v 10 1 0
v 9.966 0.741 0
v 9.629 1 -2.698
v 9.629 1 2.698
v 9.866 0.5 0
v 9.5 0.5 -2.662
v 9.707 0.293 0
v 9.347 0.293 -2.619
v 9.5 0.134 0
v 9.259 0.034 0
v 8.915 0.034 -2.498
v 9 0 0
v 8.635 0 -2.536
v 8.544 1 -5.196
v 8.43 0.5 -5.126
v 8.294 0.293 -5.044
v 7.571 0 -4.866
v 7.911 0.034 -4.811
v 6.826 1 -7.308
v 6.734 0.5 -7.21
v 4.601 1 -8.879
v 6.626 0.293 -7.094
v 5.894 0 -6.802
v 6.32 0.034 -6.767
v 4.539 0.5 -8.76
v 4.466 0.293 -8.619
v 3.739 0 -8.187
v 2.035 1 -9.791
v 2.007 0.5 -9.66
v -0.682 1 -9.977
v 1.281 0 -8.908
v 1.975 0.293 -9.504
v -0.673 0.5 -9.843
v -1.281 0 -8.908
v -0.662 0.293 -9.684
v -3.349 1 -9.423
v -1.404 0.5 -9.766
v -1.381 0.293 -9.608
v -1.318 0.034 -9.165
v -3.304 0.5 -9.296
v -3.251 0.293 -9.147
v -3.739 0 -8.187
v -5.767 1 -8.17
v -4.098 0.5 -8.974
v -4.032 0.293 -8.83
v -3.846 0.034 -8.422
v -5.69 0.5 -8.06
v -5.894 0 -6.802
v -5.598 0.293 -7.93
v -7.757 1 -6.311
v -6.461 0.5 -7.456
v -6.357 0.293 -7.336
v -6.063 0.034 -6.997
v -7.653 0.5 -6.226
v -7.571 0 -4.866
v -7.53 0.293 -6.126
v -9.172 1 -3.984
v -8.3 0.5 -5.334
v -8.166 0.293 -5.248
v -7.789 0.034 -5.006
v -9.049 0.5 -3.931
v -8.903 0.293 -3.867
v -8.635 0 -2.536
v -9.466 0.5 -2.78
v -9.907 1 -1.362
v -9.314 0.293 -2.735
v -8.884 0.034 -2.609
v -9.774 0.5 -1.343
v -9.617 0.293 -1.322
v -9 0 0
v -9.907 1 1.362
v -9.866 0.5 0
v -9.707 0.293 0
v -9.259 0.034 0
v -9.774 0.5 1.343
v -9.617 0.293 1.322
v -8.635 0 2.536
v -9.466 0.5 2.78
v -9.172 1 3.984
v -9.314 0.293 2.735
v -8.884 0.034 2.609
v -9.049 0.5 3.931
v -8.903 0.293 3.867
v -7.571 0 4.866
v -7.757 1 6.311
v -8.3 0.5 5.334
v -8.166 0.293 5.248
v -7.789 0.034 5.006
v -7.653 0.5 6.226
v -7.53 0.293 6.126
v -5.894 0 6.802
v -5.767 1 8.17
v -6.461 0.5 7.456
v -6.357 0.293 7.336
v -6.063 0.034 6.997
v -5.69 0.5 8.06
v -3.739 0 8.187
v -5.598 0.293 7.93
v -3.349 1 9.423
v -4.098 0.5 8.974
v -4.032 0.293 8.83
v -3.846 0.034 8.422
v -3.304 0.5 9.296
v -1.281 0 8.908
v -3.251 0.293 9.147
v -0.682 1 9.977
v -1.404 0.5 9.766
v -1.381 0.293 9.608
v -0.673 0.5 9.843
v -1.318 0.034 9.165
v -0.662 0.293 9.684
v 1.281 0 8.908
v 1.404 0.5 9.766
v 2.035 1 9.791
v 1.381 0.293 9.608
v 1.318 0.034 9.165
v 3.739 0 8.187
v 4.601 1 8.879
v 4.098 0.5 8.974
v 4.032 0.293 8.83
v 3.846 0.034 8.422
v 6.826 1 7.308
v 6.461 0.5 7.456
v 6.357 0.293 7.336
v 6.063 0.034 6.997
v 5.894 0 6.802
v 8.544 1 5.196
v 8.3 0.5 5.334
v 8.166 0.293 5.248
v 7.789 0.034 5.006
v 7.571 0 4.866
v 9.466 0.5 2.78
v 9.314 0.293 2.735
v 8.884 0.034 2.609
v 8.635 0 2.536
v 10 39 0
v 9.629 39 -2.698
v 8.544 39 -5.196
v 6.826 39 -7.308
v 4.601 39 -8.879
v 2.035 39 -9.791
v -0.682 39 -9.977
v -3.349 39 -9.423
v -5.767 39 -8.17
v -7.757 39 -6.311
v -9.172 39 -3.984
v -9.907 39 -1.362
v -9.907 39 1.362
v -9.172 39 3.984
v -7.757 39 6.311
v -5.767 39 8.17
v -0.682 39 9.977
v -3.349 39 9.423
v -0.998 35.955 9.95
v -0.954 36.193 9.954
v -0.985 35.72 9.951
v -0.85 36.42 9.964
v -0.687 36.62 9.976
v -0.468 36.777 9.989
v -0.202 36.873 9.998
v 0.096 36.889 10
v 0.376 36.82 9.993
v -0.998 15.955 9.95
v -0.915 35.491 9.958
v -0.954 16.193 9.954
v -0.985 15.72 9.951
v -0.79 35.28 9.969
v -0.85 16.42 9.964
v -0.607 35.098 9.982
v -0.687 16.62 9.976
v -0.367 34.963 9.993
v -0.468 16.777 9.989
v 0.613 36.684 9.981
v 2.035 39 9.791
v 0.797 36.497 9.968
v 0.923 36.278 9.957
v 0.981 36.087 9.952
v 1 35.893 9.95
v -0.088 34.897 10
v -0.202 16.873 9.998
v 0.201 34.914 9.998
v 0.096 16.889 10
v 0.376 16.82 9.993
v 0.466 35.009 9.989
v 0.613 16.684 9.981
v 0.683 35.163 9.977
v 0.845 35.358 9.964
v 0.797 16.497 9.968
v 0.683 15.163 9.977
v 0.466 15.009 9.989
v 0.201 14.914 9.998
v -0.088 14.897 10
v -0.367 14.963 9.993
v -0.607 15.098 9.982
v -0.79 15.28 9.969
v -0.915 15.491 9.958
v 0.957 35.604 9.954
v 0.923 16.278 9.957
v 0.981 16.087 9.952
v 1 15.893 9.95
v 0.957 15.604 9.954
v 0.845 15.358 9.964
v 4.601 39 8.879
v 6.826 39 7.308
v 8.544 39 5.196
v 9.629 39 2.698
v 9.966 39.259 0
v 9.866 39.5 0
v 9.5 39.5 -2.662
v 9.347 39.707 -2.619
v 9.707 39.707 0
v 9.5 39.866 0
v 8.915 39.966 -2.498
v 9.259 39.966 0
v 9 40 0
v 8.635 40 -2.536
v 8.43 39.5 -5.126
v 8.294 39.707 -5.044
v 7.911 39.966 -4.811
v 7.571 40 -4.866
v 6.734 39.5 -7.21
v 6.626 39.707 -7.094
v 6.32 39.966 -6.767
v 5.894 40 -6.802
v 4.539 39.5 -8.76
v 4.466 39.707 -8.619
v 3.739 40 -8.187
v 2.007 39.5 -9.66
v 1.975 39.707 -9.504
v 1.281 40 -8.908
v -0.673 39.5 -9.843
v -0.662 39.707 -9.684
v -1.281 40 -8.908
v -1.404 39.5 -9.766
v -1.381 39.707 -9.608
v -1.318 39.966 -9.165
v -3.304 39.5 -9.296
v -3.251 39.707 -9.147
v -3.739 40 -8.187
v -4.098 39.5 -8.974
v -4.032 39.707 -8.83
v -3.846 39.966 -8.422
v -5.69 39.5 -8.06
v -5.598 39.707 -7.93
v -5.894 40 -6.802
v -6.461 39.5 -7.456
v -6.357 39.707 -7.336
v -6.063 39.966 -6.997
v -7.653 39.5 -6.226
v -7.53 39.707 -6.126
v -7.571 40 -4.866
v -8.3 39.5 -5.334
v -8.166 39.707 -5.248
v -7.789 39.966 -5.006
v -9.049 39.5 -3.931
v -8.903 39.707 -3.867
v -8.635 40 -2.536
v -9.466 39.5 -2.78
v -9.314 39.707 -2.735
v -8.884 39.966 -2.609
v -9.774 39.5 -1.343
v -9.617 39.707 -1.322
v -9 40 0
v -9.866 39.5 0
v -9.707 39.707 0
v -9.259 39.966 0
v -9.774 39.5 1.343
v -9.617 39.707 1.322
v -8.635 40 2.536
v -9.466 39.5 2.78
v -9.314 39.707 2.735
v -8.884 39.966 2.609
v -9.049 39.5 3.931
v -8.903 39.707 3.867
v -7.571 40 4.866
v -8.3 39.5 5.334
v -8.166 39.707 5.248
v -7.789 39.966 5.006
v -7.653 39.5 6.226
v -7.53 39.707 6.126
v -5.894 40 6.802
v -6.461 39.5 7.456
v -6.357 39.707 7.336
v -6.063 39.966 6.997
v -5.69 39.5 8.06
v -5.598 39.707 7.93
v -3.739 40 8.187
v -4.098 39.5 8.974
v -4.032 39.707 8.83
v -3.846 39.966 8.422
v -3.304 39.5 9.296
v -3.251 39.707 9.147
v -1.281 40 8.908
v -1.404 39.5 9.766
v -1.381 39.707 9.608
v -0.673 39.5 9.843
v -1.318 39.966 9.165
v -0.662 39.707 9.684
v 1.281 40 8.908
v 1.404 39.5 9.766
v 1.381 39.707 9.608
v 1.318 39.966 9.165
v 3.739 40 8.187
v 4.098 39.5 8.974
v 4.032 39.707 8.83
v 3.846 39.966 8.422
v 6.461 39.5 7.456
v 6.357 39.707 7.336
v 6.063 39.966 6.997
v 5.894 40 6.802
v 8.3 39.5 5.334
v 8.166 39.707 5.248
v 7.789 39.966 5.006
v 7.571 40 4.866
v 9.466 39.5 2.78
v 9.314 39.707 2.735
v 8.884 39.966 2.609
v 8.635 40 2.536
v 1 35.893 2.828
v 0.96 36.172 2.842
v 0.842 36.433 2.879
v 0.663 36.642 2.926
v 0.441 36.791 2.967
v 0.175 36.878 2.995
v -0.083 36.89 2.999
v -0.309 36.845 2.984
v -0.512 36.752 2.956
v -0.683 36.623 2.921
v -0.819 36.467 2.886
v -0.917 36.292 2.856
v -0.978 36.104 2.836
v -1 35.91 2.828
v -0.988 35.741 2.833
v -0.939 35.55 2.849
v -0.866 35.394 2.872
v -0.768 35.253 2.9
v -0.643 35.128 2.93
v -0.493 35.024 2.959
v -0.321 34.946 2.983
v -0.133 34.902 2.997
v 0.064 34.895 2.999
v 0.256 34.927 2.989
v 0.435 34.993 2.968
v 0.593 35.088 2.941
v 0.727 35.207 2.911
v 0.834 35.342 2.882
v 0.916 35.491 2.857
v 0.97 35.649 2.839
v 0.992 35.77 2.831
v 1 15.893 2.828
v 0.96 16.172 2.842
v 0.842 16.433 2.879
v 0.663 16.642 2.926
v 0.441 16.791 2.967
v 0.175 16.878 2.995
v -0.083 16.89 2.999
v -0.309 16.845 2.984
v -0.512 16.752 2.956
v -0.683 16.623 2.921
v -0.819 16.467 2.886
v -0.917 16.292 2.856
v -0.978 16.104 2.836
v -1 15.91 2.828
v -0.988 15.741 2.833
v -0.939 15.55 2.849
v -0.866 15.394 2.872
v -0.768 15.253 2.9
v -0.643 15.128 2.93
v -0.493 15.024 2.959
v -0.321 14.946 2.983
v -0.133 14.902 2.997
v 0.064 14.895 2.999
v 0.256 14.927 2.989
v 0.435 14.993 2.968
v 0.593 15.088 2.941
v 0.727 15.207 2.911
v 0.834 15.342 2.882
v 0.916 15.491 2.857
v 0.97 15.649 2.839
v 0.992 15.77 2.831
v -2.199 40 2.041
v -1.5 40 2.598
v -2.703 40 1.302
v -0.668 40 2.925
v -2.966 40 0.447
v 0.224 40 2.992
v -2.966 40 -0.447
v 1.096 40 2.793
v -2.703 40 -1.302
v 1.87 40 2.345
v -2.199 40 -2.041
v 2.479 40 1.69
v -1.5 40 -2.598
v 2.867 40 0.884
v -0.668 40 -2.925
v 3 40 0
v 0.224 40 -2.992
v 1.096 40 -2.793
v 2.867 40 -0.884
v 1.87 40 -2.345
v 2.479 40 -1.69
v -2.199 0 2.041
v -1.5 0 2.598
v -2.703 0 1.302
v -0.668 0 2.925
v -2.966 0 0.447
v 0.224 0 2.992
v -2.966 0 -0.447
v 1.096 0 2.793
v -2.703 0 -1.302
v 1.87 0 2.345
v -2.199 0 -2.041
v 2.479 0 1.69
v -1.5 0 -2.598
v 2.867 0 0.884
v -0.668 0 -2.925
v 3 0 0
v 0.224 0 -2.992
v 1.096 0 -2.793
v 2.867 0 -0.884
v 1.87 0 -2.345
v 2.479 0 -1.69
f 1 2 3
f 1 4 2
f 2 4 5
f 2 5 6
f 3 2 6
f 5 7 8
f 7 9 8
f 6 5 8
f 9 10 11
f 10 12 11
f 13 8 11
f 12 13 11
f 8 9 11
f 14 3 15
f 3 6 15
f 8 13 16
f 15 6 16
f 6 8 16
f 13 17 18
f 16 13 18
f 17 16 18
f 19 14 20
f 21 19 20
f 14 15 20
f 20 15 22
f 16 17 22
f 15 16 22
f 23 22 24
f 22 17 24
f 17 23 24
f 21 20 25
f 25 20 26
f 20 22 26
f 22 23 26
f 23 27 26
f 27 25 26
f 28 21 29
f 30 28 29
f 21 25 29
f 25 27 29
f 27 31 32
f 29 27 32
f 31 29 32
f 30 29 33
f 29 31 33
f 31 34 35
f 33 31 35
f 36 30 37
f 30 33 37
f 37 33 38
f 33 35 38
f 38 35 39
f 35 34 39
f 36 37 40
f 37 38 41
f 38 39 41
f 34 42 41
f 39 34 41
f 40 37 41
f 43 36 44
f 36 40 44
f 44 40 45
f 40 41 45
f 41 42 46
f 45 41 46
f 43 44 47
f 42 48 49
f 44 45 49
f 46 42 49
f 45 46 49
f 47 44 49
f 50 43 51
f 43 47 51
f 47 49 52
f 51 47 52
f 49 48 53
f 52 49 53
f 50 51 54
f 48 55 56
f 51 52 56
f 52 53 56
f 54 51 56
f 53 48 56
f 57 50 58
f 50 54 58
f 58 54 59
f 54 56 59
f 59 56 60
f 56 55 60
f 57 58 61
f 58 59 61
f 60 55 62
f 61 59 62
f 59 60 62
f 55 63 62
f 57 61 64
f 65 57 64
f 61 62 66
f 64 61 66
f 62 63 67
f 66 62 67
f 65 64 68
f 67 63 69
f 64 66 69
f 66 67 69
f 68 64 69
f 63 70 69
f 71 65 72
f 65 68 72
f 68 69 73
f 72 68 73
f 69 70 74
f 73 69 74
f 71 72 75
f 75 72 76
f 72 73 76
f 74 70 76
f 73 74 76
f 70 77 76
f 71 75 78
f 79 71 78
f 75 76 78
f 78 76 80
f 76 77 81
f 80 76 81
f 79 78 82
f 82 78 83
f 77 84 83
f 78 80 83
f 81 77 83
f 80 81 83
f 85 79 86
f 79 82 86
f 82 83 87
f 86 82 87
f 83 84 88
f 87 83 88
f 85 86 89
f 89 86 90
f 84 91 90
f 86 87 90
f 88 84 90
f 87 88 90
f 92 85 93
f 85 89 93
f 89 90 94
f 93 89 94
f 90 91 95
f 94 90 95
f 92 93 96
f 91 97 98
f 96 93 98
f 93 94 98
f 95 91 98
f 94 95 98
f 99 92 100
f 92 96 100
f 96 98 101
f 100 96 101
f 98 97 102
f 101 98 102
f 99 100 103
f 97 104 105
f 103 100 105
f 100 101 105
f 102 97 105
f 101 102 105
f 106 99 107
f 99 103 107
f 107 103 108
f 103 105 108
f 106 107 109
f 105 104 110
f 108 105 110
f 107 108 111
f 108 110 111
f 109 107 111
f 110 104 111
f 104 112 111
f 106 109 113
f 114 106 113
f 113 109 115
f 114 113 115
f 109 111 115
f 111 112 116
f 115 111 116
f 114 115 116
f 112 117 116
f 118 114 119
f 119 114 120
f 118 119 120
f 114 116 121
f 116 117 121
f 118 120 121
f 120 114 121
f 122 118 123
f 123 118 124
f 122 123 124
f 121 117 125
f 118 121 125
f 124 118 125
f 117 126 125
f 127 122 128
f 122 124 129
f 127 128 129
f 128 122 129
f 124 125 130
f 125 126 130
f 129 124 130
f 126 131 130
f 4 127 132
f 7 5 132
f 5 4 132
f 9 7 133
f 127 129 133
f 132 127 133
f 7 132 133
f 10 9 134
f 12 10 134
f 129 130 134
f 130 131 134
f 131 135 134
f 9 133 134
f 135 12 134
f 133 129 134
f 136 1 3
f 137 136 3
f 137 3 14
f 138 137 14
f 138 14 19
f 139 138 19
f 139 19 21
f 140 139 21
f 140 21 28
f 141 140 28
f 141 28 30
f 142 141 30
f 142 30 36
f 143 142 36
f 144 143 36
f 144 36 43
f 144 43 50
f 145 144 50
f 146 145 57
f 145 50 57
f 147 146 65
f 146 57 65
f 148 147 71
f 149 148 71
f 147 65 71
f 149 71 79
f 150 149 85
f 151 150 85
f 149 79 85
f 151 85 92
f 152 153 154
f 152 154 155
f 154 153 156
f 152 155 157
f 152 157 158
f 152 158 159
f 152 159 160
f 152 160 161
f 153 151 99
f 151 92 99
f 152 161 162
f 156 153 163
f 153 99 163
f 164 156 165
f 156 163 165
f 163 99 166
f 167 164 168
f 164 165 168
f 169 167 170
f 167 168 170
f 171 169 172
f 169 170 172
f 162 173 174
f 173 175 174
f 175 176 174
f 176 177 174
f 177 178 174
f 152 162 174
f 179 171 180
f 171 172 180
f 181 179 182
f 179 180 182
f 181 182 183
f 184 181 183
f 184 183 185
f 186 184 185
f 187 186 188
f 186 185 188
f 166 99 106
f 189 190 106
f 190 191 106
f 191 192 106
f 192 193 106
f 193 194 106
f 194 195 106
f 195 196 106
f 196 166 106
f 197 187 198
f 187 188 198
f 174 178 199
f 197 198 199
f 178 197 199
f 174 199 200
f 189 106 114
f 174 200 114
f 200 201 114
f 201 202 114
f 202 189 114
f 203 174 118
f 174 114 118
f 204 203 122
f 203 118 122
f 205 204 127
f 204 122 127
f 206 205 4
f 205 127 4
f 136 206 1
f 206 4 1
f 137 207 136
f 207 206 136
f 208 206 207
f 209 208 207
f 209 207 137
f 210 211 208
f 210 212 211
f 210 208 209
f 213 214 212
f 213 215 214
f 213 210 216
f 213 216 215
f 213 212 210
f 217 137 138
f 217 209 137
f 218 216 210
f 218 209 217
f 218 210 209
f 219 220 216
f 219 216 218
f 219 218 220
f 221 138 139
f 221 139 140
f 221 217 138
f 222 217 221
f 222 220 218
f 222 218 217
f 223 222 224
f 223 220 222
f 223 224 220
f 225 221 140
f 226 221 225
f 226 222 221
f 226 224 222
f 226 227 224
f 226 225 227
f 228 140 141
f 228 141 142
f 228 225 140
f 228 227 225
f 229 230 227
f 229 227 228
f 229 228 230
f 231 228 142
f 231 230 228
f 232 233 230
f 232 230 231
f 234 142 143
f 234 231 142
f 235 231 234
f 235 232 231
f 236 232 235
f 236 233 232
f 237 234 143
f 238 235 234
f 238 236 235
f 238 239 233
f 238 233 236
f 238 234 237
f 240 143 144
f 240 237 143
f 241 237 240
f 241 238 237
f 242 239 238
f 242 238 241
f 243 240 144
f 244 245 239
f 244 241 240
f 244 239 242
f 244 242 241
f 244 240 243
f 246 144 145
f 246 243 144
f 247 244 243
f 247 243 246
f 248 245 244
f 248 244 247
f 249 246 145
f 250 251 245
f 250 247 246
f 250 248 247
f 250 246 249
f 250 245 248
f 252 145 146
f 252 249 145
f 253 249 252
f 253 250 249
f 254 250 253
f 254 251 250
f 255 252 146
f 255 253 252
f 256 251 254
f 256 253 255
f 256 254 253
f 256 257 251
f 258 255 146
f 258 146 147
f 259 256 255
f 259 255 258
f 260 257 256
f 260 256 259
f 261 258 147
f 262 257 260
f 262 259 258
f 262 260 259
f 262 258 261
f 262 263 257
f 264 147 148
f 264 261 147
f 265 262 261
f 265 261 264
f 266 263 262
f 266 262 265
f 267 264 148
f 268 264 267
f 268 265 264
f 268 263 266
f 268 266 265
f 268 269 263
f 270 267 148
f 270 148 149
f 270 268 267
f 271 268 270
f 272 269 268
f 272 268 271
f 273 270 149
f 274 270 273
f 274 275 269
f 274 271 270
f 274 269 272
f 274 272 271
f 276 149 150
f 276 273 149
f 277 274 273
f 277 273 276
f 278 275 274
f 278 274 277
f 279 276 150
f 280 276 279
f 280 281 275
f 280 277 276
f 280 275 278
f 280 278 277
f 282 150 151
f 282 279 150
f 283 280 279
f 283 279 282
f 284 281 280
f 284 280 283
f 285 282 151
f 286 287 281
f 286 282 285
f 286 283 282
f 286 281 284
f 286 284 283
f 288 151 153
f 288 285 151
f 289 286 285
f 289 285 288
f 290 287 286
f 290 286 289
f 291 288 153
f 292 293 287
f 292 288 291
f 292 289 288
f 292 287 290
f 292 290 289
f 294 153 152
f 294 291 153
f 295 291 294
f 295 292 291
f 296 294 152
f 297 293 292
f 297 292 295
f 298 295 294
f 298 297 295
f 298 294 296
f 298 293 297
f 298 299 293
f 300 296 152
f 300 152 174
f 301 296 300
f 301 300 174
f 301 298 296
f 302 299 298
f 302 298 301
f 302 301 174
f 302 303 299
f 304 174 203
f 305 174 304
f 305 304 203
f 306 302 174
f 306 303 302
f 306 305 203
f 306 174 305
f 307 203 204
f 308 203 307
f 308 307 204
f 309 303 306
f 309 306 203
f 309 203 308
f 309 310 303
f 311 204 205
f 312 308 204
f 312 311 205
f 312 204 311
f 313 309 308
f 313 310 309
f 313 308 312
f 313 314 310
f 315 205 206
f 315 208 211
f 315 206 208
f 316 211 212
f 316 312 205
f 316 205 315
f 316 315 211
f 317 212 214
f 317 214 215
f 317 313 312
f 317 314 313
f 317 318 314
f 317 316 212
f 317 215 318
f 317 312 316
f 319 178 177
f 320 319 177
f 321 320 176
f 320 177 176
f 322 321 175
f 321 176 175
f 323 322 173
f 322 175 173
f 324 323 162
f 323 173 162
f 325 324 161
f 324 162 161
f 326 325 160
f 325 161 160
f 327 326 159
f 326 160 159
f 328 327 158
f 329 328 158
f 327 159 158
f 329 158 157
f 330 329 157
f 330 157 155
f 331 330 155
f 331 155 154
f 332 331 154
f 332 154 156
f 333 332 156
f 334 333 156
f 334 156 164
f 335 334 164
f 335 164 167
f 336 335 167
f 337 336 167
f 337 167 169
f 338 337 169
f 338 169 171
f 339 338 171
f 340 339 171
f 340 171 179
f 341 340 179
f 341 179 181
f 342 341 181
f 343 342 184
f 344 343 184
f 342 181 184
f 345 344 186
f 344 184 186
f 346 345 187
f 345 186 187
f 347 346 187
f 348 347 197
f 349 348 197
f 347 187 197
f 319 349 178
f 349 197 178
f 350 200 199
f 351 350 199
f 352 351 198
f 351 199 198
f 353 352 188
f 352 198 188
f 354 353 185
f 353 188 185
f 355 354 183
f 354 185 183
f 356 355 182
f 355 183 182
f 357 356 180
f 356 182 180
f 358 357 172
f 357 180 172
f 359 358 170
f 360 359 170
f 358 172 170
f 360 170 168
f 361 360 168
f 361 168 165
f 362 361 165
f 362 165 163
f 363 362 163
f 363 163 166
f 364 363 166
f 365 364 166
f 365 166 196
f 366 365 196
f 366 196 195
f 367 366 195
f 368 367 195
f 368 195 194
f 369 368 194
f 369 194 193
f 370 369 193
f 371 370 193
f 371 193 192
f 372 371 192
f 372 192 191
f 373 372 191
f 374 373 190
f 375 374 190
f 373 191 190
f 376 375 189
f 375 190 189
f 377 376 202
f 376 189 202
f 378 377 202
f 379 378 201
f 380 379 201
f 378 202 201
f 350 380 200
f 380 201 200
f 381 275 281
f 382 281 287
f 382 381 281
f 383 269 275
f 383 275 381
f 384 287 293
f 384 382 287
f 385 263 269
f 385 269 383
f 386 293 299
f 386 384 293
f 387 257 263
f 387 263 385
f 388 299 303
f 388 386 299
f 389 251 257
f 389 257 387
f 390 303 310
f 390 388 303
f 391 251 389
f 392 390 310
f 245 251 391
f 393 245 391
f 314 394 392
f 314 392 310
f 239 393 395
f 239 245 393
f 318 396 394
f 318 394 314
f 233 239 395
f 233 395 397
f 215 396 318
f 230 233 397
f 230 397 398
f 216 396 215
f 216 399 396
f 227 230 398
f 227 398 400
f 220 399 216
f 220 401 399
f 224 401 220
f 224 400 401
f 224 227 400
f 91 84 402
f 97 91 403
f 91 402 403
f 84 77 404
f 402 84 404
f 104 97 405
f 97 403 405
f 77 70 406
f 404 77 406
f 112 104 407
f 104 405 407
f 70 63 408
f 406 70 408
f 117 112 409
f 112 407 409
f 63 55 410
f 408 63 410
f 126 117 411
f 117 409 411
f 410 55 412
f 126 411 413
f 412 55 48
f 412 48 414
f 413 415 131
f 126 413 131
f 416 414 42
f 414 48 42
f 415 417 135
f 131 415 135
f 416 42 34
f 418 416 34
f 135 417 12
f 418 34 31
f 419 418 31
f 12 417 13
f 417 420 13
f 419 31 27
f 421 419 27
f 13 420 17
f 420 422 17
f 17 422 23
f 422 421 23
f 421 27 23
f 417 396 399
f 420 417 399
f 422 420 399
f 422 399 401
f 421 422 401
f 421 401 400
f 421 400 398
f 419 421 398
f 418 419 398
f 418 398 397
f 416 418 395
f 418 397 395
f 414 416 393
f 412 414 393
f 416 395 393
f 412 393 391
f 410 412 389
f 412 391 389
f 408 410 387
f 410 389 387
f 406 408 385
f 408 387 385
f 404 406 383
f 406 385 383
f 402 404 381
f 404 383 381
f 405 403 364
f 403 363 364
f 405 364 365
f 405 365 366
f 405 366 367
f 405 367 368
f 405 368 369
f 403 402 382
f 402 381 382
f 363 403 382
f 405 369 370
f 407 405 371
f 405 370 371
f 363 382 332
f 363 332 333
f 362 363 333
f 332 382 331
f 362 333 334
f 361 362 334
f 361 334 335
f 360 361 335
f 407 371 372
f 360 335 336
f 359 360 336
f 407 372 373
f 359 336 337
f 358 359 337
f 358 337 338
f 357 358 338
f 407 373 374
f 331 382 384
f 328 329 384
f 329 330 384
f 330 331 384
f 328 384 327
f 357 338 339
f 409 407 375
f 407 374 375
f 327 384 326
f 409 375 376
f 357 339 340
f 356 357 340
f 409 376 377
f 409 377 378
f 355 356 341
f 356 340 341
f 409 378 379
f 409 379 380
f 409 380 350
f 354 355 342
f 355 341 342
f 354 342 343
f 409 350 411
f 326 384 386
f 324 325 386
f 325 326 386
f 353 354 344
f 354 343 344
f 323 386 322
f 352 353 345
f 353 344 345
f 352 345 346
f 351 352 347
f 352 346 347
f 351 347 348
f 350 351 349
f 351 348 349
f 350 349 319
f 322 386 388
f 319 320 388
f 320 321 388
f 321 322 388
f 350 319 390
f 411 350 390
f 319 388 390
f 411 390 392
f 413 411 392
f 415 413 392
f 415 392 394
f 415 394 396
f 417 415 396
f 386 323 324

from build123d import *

# Parameters (mm, degrees)
SKETCH1_R           = 10
BOSS_EXTRUDE1_DEPTH = 40
FILLET1_R           = 1
FILLET2_R           = 1
SKETCH2_R           = 3
CUT_EXTRUDE1_DEPTH  = 41
CUT_EXTRUDE2_REACH  = 22
SKETCH4_R           = 1


with BuildPart() as part:
    # Sketch1 → Boss-Extrude1 (new body)
    with BuildSketch(Plane(origin=(0, 0, 0), x_dir=(1, 0, 0), z_dir=(0, 1, 0))):
        Circle(SKETCH1_R)
    extrude(amount=BOSS_EXTRUDE1_DEPTH)

    # Fillet1
    fillet1_edges = [part.edges().sort_by_distance(p)[0] for p in [
        (-10, 40, 0),
    ]]
    fillet(fillet1_edges, radius=FILLET1_R)

    # Fillet2
    fillet2_edges = [part.edges().sort_by_distance(p)[0] for p in [
        (-10, 0, 0),
    ]]
    fillet(fillet2_edges, radius=FILLET2_R)

    # Sketch2 → Cut-Extrude1 (cut, through all)
    with BuildSketch(Plane(origin=(0, 40, 0), x_dir=(1, 0, 0), z_dir=(0, 1, 0))):
        Circle(SKETCH2_R)
    extrude(amount=-CUT_EXTRUDE1_DEPTH, mode=Mode.SUBTRACT)

    # Sketch4 → Cut-Extrude2 (cut, up to next)
    with BuildSketch(Plane(origin=(0, 40, 10), x_dir=(1, 0, 0), z_dir=(0, 0, 1)), mode=Mode.PRIVATE) as cut_extrude2_sk1:
        with Locations((0, -4.106598233)):
            Circle(SKETCH4_R)
    cut_extrude2_tool1 = extrude(cut_extrude2_sk1.sketch, amount=-CUT_EXTRUDE2_REACH, mode=Mode.PRIVATE) & part.part
    add(cut_extrude2_tool1.solids().sort_by_distance((0, 35.893402, 10))[0], mode=Mode.SUBTRACT)
    # Sketch4 → Cut-Extrude2 (cut, up to next)
    with BuildSketch(Plane(origin=(0, 40, 10), x_dir=(1, 0, 0), z_dir=(0, 0, 1)), mode=Mode.PRIVATE) as cut_extrude2_sk2:
        with Locations((0, -24.106598233)):
            Circle(SKETCH4_R)
    cut_extrude2_tool2 = extrude(cut_extrude2_sk2.sketch, amount=-CUT_EXTRUDE2_REACH, mode=Mode.PRIVATE) & part.part
    add(cut_extrude2_tool2.solids().sort_by_distance((0, 15.893402, 10))[0], mode=Mode.SUBTRACT)


solid = part.part
